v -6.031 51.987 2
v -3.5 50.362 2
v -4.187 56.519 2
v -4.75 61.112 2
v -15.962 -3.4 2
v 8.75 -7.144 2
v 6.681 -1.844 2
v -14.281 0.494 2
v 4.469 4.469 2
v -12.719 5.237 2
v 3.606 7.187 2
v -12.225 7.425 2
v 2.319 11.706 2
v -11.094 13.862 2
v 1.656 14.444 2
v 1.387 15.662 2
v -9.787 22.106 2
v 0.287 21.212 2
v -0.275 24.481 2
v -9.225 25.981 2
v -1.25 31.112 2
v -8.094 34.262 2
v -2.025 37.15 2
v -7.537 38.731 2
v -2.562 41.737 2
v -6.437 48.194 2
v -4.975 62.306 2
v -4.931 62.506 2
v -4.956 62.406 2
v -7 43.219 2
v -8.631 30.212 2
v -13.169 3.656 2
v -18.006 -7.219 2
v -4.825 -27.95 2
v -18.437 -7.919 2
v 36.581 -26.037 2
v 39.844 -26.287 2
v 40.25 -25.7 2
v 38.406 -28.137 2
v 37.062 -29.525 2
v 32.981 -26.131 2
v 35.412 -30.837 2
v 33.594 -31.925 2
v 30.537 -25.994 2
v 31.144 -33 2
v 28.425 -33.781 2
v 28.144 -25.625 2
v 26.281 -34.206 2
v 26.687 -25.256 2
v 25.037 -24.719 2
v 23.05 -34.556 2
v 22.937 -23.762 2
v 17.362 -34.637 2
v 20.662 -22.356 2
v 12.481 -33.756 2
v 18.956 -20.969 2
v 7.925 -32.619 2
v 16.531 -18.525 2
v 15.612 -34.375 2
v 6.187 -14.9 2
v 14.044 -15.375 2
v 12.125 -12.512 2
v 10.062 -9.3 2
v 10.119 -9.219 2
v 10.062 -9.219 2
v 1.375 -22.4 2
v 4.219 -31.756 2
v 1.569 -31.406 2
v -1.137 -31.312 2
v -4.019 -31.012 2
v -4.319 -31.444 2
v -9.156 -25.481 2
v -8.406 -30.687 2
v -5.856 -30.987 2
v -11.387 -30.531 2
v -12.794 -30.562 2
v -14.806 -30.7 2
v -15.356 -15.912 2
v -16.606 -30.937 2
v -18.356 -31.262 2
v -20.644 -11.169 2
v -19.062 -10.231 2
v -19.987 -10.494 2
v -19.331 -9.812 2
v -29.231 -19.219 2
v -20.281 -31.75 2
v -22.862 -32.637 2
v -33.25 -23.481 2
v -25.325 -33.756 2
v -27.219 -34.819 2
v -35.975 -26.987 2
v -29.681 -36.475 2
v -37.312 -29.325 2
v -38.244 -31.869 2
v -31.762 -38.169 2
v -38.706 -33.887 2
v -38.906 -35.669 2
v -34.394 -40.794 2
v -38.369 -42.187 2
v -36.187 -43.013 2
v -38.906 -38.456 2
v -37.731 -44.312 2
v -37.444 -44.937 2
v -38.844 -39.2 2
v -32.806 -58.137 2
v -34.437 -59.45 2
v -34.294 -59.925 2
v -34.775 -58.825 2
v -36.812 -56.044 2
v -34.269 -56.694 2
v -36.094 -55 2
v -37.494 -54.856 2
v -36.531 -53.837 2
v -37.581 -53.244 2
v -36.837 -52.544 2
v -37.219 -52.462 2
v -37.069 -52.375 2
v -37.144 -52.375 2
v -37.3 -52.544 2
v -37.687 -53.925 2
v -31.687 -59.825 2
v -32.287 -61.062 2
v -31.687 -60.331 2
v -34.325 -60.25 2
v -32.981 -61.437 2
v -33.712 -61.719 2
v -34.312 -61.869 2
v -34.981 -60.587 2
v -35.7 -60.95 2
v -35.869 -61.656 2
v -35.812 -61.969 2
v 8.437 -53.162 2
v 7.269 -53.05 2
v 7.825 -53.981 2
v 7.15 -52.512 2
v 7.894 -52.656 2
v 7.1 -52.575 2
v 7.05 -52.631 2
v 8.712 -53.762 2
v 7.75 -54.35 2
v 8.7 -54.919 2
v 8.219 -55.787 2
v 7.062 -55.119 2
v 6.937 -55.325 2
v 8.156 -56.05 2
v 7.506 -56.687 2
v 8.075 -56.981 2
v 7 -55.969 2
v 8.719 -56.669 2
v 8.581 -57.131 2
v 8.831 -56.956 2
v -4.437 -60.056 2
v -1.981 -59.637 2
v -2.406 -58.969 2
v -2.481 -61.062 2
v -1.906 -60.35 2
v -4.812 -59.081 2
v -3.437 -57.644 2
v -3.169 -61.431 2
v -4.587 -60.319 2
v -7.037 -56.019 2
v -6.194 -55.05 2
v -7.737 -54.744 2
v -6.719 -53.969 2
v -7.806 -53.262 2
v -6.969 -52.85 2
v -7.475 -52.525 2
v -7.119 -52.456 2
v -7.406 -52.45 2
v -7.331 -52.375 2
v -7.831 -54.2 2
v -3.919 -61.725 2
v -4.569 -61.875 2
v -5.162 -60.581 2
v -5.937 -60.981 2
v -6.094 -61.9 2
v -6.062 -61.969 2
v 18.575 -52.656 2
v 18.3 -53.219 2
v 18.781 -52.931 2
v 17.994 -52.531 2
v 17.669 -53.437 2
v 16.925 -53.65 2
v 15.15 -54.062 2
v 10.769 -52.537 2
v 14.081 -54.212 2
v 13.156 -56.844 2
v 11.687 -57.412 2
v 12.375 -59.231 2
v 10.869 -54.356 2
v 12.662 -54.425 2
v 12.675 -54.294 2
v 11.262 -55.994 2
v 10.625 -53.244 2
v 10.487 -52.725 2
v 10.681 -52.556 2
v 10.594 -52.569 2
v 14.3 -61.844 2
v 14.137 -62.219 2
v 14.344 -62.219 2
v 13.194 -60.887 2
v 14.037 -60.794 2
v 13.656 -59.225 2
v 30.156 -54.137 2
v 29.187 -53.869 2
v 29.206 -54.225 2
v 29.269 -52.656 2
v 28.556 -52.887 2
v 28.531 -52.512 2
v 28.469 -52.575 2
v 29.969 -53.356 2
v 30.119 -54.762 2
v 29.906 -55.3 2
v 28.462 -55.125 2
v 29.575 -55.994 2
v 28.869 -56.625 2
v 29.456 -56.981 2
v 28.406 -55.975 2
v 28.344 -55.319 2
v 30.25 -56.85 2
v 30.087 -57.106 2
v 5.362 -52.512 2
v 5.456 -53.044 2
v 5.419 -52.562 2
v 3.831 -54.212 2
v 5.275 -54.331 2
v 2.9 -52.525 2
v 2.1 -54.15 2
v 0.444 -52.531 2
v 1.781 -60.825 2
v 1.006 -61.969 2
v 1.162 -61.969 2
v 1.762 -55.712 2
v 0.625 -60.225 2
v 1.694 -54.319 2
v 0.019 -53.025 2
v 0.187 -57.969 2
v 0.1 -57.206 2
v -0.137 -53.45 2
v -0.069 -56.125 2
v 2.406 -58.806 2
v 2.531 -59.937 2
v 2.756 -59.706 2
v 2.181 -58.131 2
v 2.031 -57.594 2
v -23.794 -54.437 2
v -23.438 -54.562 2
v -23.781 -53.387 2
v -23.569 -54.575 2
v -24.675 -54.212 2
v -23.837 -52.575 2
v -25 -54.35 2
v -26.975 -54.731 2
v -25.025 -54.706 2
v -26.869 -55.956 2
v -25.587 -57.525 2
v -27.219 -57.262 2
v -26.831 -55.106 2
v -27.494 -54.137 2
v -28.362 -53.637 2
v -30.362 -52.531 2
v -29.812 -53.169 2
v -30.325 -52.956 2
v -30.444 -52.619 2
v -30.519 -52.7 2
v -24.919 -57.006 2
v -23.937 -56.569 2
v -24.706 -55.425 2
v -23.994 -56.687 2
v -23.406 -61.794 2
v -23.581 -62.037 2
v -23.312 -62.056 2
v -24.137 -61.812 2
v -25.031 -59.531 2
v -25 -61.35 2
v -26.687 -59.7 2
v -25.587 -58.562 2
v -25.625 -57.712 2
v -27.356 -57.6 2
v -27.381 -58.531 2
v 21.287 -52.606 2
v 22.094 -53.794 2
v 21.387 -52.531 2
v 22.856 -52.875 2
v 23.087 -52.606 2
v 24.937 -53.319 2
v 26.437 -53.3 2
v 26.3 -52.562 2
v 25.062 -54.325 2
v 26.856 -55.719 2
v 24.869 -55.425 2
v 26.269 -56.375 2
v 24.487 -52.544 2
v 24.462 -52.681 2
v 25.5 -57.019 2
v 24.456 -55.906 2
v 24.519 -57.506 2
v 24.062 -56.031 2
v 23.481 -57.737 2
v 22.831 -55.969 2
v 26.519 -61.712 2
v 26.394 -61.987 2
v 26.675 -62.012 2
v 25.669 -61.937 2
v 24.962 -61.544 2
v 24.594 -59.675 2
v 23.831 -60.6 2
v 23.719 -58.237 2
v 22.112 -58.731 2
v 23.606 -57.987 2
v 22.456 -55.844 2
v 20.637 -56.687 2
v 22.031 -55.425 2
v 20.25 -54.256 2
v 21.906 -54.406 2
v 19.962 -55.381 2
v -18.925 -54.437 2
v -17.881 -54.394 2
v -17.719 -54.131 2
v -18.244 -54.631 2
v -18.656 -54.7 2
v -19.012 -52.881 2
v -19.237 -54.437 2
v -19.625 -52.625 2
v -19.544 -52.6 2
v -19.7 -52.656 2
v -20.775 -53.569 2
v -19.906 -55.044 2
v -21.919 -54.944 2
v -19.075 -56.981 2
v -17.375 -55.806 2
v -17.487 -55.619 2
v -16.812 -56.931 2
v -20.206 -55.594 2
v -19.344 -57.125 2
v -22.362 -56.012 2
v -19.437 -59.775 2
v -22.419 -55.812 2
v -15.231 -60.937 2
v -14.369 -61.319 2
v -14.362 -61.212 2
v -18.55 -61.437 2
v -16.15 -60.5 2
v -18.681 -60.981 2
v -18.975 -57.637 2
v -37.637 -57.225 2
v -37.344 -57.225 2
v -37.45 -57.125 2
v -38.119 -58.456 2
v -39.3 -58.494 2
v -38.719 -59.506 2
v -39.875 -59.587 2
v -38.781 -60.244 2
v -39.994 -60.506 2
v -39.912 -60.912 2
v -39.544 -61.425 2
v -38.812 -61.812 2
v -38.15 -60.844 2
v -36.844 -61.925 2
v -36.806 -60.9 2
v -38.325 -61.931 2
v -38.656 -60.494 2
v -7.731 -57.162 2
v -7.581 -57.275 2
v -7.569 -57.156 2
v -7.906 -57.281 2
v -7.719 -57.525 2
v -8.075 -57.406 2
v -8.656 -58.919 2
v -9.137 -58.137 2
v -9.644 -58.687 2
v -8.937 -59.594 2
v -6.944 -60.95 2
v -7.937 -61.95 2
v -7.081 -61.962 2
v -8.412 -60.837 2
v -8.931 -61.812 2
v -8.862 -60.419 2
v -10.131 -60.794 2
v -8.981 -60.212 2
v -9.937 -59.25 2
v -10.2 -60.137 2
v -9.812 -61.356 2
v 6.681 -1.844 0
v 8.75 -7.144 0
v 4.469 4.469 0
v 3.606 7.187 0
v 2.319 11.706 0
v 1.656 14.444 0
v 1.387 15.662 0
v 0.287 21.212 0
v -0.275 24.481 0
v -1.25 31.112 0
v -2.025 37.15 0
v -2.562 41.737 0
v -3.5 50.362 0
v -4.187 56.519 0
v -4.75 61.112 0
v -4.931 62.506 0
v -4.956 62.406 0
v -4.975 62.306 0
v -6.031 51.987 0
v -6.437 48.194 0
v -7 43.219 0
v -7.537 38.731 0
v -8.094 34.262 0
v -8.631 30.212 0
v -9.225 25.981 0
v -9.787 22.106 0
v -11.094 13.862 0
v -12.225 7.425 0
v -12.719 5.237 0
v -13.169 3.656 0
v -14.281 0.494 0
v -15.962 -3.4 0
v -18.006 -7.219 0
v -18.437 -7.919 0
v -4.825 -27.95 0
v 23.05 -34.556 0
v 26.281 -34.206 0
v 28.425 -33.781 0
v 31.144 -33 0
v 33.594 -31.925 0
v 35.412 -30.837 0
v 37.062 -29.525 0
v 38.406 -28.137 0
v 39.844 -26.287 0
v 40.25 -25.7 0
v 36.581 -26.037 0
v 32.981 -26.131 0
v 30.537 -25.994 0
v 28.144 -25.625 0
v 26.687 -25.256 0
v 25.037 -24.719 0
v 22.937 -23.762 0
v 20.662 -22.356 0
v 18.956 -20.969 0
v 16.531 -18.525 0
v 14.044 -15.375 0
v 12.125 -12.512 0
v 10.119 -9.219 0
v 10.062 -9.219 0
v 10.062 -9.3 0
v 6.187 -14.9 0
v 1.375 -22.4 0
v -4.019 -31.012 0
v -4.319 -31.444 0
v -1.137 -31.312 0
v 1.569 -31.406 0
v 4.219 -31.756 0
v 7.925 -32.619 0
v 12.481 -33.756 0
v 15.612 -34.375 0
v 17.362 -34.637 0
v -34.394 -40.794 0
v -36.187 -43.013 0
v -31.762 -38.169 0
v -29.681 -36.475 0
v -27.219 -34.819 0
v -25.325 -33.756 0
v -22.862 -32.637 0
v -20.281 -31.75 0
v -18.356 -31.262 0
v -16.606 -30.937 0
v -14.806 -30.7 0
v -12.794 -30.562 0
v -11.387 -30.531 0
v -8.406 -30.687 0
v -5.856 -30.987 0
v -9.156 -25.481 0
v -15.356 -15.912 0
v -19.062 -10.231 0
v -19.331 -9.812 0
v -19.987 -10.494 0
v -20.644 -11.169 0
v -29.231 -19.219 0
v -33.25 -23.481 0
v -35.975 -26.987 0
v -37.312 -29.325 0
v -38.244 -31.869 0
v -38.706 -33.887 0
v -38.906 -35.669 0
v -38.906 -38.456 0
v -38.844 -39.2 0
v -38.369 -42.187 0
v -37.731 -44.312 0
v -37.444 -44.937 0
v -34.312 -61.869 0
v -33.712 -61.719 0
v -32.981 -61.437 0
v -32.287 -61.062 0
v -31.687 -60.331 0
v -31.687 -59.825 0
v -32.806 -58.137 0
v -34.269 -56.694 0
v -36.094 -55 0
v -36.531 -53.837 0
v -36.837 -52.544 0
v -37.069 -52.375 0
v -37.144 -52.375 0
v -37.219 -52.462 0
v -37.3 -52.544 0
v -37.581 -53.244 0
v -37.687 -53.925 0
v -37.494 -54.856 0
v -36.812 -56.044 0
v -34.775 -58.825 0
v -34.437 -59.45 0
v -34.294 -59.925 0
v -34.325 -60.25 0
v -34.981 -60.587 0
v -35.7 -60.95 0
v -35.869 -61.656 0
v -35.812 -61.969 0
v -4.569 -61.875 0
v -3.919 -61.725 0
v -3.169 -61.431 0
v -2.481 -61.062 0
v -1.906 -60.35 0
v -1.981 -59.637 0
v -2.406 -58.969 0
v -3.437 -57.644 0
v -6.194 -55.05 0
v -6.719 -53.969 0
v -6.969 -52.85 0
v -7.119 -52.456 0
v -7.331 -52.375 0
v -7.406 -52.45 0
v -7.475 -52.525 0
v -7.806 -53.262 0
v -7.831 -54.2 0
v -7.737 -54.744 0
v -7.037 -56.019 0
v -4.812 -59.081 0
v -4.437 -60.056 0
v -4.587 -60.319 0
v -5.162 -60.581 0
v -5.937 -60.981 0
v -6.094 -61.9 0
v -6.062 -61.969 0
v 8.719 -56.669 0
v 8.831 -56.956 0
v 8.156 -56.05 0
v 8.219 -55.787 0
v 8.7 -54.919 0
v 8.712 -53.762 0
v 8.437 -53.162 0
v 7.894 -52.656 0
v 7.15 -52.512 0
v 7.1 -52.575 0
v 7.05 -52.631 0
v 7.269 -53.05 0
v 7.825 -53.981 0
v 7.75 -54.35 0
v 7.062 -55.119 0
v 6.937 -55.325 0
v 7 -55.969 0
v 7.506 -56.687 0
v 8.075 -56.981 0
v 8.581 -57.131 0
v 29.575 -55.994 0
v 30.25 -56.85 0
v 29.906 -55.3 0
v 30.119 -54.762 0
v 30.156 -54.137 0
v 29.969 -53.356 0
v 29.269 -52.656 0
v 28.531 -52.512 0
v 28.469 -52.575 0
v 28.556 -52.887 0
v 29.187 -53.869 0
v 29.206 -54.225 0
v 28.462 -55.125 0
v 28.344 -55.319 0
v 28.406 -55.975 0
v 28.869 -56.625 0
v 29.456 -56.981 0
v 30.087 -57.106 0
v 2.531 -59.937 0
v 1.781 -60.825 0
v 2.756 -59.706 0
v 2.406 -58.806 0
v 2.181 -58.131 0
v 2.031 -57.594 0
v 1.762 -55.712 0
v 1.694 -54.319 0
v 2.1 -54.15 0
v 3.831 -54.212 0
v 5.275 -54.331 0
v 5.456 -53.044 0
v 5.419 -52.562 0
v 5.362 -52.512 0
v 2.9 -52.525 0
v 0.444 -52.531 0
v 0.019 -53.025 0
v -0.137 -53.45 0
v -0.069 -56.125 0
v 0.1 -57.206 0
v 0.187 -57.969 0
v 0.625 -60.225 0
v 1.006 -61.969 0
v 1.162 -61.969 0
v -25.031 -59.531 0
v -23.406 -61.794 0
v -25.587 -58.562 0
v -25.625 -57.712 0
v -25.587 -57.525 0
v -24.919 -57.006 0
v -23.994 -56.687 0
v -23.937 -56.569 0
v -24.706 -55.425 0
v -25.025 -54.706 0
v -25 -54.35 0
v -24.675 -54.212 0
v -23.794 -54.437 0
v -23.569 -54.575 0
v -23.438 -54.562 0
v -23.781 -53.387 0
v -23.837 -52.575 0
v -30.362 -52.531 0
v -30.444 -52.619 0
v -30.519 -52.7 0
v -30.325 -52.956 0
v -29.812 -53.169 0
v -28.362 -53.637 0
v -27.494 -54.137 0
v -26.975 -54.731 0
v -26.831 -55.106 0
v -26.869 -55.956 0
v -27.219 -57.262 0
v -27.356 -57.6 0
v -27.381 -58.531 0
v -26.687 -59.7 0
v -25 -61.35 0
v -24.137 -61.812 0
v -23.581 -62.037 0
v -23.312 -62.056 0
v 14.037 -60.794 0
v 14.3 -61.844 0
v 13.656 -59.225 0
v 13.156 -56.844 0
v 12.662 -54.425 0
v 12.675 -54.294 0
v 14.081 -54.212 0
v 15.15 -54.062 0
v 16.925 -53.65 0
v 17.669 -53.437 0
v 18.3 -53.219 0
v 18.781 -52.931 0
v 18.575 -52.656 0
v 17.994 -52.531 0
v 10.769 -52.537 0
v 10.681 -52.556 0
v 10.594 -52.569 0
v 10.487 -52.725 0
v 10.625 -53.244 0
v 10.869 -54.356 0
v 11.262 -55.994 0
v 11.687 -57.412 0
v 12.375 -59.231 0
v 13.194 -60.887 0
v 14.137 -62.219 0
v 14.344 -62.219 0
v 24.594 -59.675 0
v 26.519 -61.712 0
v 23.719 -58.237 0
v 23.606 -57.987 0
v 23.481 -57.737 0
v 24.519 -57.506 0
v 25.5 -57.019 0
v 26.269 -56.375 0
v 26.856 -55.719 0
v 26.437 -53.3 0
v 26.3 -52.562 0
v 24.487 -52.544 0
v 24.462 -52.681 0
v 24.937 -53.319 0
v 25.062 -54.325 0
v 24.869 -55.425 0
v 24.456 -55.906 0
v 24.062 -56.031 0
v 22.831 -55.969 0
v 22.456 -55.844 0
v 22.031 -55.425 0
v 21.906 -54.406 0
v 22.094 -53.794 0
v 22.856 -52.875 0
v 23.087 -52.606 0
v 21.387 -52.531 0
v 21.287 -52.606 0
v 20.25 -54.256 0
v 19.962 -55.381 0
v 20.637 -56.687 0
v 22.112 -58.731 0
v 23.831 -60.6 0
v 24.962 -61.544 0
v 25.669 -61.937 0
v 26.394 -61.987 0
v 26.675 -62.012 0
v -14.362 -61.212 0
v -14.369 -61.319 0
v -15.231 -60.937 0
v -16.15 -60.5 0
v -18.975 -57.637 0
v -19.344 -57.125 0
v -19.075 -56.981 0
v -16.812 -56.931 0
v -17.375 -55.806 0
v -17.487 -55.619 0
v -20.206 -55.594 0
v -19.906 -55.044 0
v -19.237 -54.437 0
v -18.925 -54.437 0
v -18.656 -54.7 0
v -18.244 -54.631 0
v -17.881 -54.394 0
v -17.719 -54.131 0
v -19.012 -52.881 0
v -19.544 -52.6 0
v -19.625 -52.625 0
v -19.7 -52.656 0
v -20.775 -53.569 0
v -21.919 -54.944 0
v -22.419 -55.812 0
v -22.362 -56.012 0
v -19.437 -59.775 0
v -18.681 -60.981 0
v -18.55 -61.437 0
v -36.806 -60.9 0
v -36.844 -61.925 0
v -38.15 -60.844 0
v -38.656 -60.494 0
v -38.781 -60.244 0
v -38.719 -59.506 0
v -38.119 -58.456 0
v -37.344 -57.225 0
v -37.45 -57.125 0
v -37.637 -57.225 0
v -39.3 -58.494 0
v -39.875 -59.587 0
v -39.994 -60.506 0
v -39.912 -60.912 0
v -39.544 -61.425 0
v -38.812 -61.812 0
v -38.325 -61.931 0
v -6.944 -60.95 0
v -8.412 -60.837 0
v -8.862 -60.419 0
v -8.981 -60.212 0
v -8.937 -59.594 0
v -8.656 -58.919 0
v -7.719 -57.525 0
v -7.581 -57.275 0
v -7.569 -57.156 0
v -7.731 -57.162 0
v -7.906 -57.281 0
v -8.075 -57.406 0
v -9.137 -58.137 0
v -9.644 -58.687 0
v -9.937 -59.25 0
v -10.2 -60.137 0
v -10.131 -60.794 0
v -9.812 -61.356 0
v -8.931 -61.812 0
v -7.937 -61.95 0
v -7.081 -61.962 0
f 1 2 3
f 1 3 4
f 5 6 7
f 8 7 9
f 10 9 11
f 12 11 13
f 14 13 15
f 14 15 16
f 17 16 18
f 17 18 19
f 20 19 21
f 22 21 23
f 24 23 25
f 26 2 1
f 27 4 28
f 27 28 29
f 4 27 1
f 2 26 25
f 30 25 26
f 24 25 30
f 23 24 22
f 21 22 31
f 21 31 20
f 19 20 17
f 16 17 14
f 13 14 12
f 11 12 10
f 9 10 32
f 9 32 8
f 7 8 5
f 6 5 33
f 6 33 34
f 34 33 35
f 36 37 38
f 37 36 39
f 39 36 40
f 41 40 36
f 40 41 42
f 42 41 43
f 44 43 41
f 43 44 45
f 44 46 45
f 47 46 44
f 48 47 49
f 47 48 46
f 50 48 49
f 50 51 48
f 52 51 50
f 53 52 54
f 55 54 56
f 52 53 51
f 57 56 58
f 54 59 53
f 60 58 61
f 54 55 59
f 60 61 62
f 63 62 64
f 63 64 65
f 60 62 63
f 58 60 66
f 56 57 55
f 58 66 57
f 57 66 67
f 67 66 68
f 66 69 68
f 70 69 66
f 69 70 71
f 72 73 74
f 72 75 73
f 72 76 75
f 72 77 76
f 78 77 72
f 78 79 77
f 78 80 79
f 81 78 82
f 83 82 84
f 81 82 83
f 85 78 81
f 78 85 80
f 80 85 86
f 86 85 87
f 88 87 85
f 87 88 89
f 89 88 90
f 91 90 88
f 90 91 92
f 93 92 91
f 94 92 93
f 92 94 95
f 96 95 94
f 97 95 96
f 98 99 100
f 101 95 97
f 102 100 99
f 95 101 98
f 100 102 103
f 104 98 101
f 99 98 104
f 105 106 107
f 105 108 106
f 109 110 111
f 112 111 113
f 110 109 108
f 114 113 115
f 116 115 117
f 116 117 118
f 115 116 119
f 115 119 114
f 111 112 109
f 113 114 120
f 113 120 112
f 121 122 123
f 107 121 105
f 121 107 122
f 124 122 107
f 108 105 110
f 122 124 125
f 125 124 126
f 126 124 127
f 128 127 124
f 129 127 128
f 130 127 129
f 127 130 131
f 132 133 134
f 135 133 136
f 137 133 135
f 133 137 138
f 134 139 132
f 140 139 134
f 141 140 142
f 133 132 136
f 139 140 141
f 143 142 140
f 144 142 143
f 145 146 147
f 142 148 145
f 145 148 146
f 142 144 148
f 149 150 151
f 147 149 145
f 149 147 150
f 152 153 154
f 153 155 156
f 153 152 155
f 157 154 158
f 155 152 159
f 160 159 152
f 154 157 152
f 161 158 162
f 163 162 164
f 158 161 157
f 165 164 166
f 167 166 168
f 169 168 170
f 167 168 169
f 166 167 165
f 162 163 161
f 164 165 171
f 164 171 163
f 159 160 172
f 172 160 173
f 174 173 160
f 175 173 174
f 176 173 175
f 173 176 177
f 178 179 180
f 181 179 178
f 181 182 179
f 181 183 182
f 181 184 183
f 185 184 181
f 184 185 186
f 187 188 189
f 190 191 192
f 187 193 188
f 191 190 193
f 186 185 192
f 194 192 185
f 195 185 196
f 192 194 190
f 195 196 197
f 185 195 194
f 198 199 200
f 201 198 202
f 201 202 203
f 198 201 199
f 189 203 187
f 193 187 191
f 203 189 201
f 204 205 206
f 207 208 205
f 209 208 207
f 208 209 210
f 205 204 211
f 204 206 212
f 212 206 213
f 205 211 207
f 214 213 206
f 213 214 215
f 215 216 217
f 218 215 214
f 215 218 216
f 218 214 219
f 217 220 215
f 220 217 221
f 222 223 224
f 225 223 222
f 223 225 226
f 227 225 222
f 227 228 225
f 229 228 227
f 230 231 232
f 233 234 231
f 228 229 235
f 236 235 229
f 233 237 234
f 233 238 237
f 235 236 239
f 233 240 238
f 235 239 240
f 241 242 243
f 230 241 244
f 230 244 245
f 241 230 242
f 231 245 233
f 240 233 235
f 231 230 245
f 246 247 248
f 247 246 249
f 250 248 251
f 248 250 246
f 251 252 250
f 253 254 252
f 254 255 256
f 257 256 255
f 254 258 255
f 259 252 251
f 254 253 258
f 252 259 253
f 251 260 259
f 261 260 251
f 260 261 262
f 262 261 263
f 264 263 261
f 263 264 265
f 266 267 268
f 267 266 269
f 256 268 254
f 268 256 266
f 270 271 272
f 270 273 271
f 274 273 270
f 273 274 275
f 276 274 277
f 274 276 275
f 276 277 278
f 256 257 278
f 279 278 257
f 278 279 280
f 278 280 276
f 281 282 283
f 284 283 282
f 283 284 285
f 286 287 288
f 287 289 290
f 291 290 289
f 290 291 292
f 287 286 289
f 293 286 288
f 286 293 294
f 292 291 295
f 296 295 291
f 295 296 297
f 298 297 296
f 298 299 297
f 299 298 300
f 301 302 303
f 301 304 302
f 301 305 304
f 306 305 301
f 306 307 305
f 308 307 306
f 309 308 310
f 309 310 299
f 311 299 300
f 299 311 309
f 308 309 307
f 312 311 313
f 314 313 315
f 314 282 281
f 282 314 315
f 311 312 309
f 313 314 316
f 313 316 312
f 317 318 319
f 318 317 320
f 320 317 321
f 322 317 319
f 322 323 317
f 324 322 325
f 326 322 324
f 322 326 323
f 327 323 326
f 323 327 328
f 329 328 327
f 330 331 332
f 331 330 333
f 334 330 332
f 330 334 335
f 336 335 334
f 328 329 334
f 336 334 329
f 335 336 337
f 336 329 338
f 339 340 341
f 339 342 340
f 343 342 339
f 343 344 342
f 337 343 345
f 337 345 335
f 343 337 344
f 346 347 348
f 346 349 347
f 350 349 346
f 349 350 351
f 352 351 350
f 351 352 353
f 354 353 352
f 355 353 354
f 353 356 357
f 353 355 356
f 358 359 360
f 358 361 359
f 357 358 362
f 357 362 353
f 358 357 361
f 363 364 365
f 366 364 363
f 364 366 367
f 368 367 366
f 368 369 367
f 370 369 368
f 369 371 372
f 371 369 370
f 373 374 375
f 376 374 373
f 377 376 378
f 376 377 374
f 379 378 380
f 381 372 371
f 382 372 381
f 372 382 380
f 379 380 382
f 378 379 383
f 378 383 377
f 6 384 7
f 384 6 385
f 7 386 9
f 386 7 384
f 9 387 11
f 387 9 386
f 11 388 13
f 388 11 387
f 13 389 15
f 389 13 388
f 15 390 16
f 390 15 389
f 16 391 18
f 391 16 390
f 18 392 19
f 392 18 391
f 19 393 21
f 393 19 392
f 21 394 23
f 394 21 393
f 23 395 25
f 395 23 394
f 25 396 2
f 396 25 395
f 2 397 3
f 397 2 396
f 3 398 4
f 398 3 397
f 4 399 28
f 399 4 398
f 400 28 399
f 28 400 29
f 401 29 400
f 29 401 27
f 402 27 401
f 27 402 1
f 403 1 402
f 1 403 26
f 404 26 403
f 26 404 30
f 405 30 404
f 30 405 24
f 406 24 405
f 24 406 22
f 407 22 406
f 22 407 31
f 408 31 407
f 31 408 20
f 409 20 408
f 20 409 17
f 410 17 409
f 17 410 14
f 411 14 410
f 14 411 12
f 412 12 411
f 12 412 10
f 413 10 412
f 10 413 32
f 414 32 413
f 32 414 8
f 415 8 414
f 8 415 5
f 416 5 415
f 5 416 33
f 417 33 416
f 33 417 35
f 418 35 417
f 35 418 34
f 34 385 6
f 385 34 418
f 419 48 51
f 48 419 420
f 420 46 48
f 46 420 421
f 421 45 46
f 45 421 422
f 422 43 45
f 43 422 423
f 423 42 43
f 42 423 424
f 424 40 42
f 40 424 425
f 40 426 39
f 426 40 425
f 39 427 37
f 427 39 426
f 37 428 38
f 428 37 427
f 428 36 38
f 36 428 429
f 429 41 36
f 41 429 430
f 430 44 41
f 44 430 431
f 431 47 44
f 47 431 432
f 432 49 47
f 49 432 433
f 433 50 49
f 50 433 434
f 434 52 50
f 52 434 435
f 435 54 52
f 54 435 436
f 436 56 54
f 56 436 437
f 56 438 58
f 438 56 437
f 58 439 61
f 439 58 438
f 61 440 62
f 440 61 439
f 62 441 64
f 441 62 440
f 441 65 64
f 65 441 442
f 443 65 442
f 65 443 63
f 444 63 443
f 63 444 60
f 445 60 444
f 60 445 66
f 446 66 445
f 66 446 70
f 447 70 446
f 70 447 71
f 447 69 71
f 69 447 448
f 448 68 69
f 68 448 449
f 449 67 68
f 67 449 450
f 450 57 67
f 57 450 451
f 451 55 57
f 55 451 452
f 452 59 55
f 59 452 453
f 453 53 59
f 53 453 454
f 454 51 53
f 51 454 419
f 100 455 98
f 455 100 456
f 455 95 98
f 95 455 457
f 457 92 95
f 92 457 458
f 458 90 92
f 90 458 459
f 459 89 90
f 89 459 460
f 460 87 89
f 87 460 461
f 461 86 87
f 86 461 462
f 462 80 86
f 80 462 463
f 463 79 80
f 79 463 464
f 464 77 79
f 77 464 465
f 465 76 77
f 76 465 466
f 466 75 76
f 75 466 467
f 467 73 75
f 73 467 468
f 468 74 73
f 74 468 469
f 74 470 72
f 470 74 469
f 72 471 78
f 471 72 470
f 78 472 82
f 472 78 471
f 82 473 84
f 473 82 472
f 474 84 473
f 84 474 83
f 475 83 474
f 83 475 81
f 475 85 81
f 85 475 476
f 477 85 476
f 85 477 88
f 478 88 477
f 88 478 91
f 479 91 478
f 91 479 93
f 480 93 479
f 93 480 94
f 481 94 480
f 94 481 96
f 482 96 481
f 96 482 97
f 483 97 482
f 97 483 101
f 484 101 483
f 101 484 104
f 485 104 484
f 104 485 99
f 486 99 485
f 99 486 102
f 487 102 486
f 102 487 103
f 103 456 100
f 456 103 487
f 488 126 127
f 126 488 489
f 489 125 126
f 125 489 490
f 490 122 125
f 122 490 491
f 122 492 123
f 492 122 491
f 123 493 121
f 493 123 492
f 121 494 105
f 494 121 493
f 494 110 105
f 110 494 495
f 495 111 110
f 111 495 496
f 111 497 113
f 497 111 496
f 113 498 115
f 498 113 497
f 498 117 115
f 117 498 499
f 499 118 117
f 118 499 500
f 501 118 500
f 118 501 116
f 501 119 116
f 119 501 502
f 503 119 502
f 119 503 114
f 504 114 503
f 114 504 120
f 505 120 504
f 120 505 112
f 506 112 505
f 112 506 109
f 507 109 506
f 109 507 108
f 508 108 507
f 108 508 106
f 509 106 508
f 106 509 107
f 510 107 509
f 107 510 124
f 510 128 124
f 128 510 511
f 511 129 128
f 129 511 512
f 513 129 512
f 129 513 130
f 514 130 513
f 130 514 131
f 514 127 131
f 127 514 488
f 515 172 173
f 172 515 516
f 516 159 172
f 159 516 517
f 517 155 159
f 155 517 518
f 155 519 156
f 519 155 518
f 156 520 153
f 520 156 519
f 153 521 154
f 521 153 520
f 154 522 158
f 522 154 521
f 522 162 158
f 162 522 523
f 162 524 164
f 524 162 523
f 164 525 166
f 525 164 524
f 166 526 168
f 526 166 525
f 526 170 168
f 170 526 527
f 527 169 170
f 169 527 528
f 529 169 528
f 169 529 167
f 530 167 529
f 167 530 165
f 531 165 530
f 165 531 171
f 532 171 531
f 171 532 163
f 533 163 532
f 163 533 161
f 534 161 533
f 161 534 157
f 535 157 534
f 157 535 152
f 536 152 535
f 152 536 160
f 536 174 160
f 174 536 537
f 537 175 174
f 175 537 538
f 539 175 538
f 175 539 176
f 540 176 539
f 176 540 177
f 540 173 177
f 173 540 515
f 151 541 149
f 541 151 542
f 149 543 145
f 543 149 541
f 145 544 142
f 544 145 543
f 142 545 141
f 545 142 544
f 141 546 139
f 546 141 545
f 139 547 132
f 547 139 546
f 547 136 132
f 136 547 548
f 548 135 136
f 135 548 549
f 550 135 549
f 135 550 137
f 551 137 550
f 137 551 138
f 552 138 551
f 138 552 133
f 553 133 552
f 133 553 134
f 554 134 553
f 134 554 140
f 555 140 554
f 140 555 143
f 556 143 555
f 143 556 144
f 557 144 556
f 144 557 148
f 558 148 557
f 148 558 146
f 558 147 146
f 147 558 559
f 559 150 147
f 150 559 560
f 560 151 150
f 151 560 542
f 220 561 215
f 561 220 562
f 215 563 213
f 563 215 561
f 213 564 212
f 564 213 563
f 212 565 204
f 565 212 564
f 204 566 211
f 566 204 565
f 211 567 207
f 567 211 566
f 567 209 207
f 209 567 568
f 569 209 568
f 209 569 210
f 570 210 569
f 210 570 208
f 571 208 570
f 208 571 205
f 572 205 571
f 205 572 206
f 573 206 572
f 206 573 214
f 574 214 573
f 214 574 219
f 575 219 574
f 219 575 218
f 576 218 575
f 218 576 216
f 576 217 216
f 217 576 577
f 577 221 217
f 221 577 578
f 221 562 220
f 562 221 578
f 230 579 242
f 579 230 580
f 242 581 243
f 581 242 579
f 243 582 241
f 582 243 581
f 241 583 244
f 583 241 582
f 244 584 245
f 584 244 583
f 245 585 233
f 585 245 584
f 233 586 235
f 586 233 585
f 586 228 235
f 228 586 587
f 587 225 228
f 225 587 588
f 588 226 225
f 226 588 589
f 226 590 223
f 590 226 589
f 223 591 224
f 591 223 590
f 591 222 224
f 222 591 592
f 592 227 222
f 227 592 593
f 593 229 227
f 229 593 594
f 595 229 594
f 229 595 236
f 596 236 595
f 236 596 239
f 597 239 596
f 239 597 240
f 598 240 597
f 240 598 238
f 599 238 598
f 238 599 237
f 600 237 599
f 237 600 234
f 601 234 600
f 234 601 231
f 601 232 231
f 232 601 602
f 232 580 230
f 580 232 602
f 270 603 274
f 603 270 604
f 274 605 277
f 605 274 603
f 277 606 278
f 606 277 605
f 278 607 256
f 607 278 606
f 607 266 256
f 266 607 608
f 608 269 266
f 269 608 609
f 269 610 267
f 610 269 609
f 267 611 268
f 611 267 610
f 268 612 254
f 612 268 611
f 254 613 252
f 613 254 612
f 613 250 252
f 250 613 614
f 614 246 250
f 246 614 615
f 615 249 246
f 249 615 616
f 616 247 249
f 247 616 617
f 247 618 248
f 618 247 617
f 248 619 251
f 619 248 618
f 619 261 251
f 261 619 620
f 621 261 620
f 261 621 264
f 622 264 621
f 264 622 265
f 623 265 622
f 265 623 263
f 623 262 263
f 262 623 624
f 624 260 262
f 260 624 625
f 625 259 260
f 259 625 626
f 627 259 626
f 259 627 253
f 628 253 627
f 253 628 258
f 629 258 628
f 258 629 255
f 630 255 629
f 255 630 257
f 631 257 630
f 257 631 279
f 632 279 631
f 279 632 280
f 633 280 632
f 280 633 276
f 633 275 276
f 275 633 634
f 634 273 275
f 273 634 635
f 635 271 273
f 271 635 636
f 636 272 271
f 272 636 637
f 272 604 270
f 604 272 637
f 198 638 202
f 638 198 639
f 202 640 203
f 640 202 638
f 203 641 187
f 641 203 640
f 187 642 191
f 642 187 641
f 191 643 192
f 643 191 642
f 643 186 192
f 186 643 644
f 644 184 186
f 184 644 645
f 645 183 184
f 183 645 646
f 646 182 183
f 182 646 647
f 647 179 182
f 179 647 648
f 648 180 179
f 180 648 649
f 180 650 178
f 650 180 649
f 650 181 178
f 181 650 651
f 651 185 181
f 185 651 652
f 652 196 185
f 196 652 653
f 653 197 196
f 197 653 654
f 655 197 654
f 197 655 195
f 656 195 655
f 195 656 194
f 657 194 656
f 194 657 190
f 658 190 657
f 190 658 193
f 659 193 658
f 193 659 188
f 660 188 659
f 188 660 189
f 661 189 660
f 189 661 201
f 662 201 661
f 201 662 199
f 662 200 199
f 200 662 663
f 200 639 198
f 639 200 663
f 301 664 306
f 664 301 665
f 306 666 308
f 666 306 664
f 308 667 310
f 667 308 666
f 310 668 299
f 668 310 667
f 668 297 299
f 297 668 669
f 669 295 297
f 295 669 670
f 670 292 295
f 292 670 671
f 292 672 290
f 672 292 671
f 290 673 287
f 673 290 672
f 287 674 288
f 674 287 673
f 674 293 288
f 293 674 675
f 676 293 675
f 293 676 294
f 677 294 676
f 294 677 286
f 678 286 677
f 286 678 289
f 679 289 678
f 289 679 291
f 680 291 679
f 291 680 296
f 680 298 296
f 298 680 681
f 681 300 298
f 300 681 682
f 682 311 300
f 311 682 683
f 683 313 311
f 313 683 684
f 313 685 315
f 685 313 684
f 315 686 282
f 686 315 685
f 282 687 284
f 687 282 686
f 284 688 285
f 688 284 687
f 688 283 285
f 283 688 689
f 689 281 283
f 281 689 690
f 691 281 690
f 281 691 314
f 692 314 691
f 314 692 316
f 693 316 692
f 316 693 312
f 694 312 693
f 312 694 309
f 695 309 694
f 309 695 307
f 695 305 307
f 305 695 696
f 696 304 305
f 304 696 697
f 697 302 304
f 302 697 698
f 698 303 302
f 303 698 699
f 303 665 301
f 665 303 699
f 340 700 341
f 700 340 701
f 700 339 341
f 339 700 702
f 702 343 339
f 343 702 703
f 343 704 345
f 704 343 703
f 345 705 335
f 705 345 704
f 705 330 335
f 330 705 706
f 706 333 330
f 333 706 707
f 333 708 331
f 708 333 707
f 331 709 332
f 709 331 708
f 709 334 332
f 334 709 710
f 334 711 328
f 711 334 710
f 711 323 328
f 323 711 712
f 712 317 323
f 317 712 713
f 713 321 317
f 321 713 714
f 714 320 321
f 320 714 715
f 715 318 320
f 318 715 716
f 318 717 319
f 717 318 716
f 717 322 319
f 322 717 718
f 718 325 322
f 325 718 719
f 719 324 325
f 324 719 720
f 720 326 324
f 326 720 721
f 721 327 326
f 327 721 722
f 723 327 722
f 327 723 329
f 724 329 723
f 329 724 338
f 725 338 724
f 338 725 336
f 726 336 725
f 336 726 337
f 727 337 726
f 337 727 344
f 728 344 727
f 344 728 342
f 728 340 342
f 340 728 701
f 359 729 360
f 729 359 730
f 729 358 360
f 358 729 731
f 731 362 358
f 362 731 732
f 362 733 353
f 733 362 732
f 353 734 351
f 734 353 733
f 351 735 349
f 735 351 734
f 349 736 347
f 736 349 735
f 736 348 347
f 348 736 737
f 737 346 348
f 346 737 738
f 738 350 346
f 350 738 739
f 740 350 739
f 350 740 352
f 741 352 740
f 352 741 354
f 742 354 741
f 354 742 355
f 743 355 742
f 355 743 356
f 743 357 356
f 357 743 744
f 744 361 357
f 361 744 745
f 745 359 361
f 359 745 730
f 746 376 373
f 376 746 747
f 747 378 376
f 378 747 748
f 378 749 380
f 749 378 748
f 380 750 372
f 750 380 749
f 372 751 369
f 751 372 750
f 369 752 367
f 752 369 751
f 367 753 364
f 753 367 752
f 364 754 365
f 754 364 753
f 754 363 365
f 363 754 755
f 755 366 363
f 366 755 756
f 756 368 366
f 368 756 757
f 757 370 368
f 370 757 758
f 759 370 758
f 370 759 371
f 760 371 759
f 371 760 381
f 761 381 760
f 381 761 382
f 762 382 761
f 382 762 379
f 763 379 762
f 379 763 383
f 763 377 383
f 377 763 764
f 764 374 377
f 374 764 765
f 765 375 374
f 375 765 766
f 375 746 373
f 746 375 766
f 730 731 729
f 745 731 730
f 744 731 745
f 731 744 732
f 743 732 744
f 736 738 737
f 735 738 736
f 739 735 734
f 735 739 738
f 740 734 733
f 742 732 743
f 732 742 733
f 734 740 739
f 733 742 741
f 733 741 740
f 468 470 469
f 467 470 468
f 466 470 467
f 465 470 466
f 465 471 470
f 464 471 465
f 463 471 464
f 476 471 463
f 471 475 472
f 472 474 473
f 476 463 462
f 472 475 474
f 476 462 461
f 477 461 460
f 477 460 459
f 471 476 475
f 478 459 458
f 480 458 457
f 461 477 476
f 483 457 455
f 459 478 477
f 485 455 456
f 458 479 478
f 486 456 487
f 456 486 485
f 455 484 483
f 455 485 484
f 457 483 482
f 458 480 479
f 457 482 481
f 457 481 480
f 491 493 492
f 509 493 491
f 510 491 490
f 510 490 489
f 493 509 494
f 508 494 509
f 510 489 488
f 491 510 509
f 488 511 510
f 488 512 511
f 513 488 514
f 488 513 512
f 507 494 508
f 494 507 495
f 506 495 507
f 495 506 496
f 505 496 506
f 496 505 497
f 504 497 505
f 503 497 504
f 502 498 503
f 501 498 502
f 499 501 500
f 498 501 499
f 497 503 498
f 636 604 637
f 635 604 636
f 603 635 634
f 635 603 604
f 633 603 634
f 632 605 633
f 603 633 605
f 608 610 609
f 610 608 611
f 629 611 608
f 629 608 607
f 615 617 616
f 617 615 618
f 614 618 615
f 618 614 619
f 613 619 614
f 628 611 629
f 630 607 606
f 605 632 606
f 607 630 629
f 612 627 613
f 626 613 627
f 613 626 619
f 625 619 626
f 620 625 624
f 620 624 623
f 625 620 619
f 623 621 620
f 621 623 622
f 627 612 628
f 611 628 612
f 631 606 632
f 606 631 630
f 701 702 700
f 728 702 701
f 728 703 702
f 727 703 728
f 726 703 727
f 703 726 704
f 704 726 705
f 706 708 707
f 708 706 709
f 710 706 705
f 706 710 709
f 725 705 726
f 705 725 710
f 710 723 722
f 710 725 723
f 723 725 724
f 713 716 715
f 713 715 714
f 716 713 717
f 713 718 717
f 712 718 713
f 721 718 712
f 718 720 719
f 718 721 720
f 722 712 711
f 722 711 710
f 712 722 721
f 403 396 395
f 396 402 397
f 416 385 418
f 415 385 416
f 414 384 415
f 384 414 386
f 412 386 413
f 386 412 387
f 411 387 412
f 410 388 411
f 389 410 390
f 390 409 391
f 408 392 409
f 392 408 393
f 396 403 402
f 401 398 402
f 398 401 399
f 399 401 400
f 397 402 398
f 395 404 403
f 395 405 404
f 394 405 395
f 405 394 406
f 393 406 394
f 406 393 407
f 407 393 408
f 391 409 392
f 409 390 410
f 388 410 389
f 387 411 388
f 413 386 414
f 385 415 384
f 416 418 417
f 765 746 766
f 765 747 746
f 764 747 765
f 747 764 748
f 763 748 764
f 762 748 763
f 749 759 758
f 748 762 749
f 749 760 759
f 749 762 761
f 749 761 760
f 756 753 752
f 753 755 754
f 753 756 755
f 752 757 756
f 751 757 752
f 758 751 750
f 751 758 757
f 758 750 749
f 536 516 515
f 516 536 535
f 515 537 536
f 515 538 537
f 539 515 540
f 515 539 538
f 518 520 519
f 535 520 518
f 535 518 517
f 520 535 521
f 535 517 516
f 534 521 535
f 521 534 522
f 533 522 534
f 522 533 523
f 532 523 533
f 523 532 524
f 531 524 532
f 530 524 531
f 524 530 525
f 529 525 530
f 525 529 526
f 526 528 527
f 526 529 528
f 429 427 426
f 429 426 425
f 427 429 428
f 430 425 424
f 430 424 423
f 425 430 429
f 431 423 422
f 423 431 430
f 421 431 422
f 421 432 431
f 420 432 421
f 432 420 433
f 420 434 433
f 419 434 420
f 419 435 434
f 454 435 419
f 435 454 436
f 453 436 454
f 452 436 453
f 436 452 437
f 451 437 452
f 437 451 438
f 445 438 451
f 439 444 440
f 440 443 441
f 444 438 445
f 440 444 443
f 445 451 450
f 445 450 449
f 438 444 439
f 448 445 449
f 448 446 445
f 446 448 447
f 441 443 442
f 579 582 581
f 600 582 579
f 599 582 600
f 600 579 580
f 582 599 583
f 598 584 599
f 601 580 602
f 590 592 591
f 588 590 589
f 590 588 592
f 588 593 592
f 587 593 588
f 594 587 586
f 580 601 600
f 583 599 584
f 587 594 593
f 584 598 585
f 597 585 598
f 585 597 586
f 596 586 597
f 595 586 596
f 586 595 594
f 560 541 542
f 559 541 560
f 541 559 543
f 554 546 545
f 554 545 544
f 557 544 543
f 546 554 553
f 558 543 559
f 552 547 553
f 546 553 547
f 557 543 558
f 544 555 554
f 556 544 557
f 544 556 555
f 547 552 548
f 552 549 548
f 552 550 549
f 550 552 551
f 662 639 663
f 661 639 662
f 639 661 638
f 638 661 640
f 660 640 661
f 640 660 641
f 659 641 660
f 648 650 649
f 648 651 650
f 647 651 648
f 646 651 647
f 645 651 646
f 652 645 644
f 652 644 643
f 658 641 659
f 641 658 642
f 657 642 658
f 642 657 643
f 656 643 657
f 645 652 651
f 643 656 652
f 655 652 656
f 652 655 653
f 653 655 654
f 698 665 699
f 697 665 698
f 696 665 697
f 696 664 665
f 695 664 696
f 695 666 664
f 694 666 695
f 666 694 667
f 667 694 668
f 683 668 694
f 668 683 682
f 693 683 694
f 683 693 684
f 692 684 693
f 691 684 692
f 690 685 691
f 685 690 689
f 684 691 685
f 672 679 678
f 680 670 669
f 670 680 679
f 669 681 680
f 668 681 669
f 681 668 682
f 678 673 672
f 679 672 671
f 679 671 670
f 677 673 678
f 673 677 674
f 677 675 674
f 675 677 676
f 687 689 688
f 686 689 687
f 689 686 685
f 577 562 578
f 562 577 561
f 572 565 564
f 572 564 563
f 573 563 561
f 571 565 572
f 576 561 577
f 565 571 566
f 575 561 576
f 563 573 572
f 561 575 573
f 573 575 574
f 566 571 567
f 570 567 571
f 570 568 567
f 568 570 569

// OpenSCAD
module aa08a29e41240092f5c40253c43585e2_1()
{
 /* Generated by trace2scad version 20150415
    http://aggregate.org/MAKE/TRACE2SCAD/
    Optimized model has 387/4796 original points
 */
 color([0.48, 0.48, 0.48])
 assign(minx=0) /* polygon minx=39 */
 assign(miny=0) /* polygon miny=45 */
 assign(maxx=12880) /* polygon maxx=12880 */
 assign(maxy=20000) /* polygon maxy=20001 */
 assign(dx=maxx-minx)
 assign(dy=maxy-miny)
 assign(maxd=((dx>dy)?dx:dy))
 scale([1/maxd, 1/maxd, 1])
 translate([-minx-dx/2, -miny-dy/2, 0])
 linear_extrude(height=1, convexity=387)
 union() {
  union() {
   polygon([[5647,19985],[5644,19969],[5475,18318],[5410,17711],[5320,16915],[5234,16197],[5145,15482],[5059,14834],[4964,14157],[4874,13537],[4665,12218],[4484,11188],[4405,10838],[4333,10585],[4155,10079],[3886,9456],[3559,8845],[3490,8733],[5668,5528],[7840,8857],[7509,9705],[7155,10715],[7017,11150],[6811,11873],[6705,12311],[6662,12506],[6486,13394],[6396,13917],[6240,14978],[6116,15944],[6030,16678],[5880,18058],[5770,19043],[5680,19778],[5651,20001]], convexity=6);
   polygon([[8050,8518],[8050,8512],[7430,7616],[6660,6416],[5797,5038],[5749,4969],[6258,4990],[6691,4975],[7115,4919],[7708,4781],[8437,4599],[8938,4500],[9218,4458],[10128,4471],[10645,4527],[10988,4595],[11423,4720],[11815,4892],[12106,5066],[12370,5276],[12585,5498],[12815,5794],[12880,5888],[12293,5834],[11717,5819],[11326,5841],[10943,5900],[10710,5959],[10446,6045],[10110,6198],[9746,6423],[9473,6645],[9085,7036],[8687,7540],[8380,7998],[8059,8525],[8050,8525]], convexity=9);
   polygon([[3242,8321],[3137,8213],[1763,6925],[1120,6243],[684,5682],[470,5308],[321,4901],[247,4578],[215,4293],[215,3847],[225,3728],[301,3250],[403,2910],[449,2810],[650,3118],[937,3473],[1358,3893],[1691,4164],[2085,4429],[2388,4599],[2782,4778],[3195,4920],[3503,4998],[3783,5050],[4071,5088],[4393,5110],[4618,5115],[5095,5090],[5503,5042],[4975,5923],[3983,7454],[3390,8363],[3347,8430]], convexity=7);
   polygon([[485,1606],[472,1593],[427,1481],[410,1372],[441,1223],[550,1033],[876,588],[930,488],[953,412],[948,360],[843,306],[728,248],[701,135],[710,85],[950,101],[1046,125],[1163,170],[1274,230],[1370,347],[1370,428],[1191,698],[957,929],[665,1200],[595,1386],[546,1593],[509,1620],[497,1620]], convexity=8);
   polygon([[5255,1608],[5244,1596],[5191,1478],[5187,1328],[5202,1241],[5314,1037],[5670,547],[5730,391],[5706,349],[5614,307],[5490,243],[5465,96],[5470,85],[5709,100],[5813,124],[5933,171],[6043,230],[6135,344],[6123,458],[6055,565],[5890,777],[5449,1192],[5365,1365],[5325,1544],[5301,1607],[5267,1620]], convexity=8);
   polygon([[6904,1596],[6511,1595],[6443,1516],[6418,1448],[6429,1020],[6456,847],[6470,725],[6540,364],[6601,85],[6626,85],[6725,268],[6845,410],[6881,447],[6825,591],[6789,699],[6765,785],[6722,1086],[6711,1309],[6776,1336],[7053,1326],[7284,1307],[7313,1513],[7307,1590],[7298,1598]], convexity=10);
   polygon([[7576,1588],[7568,1579],[7603,1512],[7692,1363],[7680,1304],[7570,1181],[7550,1148],[7560,1045],[7641,930],[7732,883],[7813,859],[7853,887],[7835,933],[7745,1032],[7755,1074],[7832,1213],[7834,1398],[7790,1494],[7703,1575],[7584,1598]], convexity=10);
   polygon([[11000,1593],[10995,1588],[11009,1538],[11110,1381],[11113,1324],[10994,1180],[10975,1149],[10985,1044],[11059,940],[11153,883],[11254,863],[11280,904],[11172,1041],[11225,1152],[11259,1238],[11265,1338],[11235,1463],[11123,1575],[11005,1598]], convexity=10);
   polygon([[1569,1581],[1557,1568],[1588,1527],[1670,1493],[1902,1418],[2041,1338],[2124,1243],[2147,1183],[2141,1047],[2085,838],[2063,784],[2059,635],[2170,448],[2440,184],[2578,110],[2667,74],[2710,71],[2695,113],[2435,475],[2346,630],[2340,766],[2346,796],[2453,879],[2601,930],[2610,949],[2487,1132],[2436,1247],[2440,1304],[2492,1326],[2633,1290],[2669,1268],[2690,1270],[2635,1458],[2626,1588],[1582,1595]], convexity=13);
   polygon([[8149,1591],[8135,1589],[8118,1564],[8140,1481],[8179,1303],[8242,1041],[8310,814],[8420,523],[8551,258],[8702,45],[8735,45],[8728,105],[8686,273],[8625,524],[8545,905],[8466,1292],[8468,1313],[8693,1326],[8864,1350],[9148,1416],[9267,1450],[9368,1485],[9445,1531],[9412,1575],[9319,1595],[8163,1594]], convexity=9);
   polygon([[9854,1589],[9846,1583],[9680,1319],[9634,1139],[9742,930],[9978,603],[10253,304],[10434,153],[10547,90],[10663,82],[10708,78],[10683,126],[10375,452],[10235,682],[10217,722],[10197,762],[10363,799],[10520,877],[10643,980],[10737,1085],[10670,1472],[10648,1590],[10358,1593],[10354,1571],[10430,1469],[10450,1308],[10419,1132],[10353,1055],[10290,1035],[10093,1045],[10033,1065],[9965,1132],[9945,1295],[9975,1393],[10097,1540],[10134,1583],[9862,1595]], convexity=13);
   polygon([[3300,1580],[3288,1575],[3116,1429],[2933,1209],[2853,1070],[2862,1038],[3330,436],[3451,243],[3472,170],[4141,189],[4142,206],[4003,250],[3856,320],[3404,778],[3345,860],[3388,883],[3750,891],[3660,1071],[3642,1101],[3207,1105],[3255,1193],[3362,1290],[3412,1290],[3455,1248],[3521,1259],[3579,1297],[3605,1339],[3398,1539],[3313,1584]], convexity=12);
   polygon([[433,852],[418,844],[152,641],[60,466],[41,319],[54,254],[113,172],[230,110],[308,91],[545,92],[551,256],[336,265],[255,321],[235,361],[245,479],[341,647],[465,844],[448,860]], convexity=8);
   polygon([[5175,835],[5148,815],[4978,698],[4897,610],[4850,520],[4808,378],[4819,273],[4870,183],[5011,110],[5170,88],[5307,86],[5329,248],[5094,266],[5022,333],[5003,366],[5010,465],[5055,573],[5205,796],[5227,836],[5229,855],[5203,854]], convexity=8);
  }
 }
}

module aa08a29e41240092f5c40253c43585e2()
{
 /* all layers combined, scaled to within a 1mm cube */
 scale([1, 1, 1/1])
 difference() {
  union() {
   scale([1,1,2]) translate([0,0,-0.5]) aa08a29e41240092f5c40253c43585e2_1();
  }
  translate([0,0,-2]) cube([2,2,4],center=true);
 }
}

scale([125, 125, 2]) {
	aa08a29e41240092f5c40253c43585e2();
}
